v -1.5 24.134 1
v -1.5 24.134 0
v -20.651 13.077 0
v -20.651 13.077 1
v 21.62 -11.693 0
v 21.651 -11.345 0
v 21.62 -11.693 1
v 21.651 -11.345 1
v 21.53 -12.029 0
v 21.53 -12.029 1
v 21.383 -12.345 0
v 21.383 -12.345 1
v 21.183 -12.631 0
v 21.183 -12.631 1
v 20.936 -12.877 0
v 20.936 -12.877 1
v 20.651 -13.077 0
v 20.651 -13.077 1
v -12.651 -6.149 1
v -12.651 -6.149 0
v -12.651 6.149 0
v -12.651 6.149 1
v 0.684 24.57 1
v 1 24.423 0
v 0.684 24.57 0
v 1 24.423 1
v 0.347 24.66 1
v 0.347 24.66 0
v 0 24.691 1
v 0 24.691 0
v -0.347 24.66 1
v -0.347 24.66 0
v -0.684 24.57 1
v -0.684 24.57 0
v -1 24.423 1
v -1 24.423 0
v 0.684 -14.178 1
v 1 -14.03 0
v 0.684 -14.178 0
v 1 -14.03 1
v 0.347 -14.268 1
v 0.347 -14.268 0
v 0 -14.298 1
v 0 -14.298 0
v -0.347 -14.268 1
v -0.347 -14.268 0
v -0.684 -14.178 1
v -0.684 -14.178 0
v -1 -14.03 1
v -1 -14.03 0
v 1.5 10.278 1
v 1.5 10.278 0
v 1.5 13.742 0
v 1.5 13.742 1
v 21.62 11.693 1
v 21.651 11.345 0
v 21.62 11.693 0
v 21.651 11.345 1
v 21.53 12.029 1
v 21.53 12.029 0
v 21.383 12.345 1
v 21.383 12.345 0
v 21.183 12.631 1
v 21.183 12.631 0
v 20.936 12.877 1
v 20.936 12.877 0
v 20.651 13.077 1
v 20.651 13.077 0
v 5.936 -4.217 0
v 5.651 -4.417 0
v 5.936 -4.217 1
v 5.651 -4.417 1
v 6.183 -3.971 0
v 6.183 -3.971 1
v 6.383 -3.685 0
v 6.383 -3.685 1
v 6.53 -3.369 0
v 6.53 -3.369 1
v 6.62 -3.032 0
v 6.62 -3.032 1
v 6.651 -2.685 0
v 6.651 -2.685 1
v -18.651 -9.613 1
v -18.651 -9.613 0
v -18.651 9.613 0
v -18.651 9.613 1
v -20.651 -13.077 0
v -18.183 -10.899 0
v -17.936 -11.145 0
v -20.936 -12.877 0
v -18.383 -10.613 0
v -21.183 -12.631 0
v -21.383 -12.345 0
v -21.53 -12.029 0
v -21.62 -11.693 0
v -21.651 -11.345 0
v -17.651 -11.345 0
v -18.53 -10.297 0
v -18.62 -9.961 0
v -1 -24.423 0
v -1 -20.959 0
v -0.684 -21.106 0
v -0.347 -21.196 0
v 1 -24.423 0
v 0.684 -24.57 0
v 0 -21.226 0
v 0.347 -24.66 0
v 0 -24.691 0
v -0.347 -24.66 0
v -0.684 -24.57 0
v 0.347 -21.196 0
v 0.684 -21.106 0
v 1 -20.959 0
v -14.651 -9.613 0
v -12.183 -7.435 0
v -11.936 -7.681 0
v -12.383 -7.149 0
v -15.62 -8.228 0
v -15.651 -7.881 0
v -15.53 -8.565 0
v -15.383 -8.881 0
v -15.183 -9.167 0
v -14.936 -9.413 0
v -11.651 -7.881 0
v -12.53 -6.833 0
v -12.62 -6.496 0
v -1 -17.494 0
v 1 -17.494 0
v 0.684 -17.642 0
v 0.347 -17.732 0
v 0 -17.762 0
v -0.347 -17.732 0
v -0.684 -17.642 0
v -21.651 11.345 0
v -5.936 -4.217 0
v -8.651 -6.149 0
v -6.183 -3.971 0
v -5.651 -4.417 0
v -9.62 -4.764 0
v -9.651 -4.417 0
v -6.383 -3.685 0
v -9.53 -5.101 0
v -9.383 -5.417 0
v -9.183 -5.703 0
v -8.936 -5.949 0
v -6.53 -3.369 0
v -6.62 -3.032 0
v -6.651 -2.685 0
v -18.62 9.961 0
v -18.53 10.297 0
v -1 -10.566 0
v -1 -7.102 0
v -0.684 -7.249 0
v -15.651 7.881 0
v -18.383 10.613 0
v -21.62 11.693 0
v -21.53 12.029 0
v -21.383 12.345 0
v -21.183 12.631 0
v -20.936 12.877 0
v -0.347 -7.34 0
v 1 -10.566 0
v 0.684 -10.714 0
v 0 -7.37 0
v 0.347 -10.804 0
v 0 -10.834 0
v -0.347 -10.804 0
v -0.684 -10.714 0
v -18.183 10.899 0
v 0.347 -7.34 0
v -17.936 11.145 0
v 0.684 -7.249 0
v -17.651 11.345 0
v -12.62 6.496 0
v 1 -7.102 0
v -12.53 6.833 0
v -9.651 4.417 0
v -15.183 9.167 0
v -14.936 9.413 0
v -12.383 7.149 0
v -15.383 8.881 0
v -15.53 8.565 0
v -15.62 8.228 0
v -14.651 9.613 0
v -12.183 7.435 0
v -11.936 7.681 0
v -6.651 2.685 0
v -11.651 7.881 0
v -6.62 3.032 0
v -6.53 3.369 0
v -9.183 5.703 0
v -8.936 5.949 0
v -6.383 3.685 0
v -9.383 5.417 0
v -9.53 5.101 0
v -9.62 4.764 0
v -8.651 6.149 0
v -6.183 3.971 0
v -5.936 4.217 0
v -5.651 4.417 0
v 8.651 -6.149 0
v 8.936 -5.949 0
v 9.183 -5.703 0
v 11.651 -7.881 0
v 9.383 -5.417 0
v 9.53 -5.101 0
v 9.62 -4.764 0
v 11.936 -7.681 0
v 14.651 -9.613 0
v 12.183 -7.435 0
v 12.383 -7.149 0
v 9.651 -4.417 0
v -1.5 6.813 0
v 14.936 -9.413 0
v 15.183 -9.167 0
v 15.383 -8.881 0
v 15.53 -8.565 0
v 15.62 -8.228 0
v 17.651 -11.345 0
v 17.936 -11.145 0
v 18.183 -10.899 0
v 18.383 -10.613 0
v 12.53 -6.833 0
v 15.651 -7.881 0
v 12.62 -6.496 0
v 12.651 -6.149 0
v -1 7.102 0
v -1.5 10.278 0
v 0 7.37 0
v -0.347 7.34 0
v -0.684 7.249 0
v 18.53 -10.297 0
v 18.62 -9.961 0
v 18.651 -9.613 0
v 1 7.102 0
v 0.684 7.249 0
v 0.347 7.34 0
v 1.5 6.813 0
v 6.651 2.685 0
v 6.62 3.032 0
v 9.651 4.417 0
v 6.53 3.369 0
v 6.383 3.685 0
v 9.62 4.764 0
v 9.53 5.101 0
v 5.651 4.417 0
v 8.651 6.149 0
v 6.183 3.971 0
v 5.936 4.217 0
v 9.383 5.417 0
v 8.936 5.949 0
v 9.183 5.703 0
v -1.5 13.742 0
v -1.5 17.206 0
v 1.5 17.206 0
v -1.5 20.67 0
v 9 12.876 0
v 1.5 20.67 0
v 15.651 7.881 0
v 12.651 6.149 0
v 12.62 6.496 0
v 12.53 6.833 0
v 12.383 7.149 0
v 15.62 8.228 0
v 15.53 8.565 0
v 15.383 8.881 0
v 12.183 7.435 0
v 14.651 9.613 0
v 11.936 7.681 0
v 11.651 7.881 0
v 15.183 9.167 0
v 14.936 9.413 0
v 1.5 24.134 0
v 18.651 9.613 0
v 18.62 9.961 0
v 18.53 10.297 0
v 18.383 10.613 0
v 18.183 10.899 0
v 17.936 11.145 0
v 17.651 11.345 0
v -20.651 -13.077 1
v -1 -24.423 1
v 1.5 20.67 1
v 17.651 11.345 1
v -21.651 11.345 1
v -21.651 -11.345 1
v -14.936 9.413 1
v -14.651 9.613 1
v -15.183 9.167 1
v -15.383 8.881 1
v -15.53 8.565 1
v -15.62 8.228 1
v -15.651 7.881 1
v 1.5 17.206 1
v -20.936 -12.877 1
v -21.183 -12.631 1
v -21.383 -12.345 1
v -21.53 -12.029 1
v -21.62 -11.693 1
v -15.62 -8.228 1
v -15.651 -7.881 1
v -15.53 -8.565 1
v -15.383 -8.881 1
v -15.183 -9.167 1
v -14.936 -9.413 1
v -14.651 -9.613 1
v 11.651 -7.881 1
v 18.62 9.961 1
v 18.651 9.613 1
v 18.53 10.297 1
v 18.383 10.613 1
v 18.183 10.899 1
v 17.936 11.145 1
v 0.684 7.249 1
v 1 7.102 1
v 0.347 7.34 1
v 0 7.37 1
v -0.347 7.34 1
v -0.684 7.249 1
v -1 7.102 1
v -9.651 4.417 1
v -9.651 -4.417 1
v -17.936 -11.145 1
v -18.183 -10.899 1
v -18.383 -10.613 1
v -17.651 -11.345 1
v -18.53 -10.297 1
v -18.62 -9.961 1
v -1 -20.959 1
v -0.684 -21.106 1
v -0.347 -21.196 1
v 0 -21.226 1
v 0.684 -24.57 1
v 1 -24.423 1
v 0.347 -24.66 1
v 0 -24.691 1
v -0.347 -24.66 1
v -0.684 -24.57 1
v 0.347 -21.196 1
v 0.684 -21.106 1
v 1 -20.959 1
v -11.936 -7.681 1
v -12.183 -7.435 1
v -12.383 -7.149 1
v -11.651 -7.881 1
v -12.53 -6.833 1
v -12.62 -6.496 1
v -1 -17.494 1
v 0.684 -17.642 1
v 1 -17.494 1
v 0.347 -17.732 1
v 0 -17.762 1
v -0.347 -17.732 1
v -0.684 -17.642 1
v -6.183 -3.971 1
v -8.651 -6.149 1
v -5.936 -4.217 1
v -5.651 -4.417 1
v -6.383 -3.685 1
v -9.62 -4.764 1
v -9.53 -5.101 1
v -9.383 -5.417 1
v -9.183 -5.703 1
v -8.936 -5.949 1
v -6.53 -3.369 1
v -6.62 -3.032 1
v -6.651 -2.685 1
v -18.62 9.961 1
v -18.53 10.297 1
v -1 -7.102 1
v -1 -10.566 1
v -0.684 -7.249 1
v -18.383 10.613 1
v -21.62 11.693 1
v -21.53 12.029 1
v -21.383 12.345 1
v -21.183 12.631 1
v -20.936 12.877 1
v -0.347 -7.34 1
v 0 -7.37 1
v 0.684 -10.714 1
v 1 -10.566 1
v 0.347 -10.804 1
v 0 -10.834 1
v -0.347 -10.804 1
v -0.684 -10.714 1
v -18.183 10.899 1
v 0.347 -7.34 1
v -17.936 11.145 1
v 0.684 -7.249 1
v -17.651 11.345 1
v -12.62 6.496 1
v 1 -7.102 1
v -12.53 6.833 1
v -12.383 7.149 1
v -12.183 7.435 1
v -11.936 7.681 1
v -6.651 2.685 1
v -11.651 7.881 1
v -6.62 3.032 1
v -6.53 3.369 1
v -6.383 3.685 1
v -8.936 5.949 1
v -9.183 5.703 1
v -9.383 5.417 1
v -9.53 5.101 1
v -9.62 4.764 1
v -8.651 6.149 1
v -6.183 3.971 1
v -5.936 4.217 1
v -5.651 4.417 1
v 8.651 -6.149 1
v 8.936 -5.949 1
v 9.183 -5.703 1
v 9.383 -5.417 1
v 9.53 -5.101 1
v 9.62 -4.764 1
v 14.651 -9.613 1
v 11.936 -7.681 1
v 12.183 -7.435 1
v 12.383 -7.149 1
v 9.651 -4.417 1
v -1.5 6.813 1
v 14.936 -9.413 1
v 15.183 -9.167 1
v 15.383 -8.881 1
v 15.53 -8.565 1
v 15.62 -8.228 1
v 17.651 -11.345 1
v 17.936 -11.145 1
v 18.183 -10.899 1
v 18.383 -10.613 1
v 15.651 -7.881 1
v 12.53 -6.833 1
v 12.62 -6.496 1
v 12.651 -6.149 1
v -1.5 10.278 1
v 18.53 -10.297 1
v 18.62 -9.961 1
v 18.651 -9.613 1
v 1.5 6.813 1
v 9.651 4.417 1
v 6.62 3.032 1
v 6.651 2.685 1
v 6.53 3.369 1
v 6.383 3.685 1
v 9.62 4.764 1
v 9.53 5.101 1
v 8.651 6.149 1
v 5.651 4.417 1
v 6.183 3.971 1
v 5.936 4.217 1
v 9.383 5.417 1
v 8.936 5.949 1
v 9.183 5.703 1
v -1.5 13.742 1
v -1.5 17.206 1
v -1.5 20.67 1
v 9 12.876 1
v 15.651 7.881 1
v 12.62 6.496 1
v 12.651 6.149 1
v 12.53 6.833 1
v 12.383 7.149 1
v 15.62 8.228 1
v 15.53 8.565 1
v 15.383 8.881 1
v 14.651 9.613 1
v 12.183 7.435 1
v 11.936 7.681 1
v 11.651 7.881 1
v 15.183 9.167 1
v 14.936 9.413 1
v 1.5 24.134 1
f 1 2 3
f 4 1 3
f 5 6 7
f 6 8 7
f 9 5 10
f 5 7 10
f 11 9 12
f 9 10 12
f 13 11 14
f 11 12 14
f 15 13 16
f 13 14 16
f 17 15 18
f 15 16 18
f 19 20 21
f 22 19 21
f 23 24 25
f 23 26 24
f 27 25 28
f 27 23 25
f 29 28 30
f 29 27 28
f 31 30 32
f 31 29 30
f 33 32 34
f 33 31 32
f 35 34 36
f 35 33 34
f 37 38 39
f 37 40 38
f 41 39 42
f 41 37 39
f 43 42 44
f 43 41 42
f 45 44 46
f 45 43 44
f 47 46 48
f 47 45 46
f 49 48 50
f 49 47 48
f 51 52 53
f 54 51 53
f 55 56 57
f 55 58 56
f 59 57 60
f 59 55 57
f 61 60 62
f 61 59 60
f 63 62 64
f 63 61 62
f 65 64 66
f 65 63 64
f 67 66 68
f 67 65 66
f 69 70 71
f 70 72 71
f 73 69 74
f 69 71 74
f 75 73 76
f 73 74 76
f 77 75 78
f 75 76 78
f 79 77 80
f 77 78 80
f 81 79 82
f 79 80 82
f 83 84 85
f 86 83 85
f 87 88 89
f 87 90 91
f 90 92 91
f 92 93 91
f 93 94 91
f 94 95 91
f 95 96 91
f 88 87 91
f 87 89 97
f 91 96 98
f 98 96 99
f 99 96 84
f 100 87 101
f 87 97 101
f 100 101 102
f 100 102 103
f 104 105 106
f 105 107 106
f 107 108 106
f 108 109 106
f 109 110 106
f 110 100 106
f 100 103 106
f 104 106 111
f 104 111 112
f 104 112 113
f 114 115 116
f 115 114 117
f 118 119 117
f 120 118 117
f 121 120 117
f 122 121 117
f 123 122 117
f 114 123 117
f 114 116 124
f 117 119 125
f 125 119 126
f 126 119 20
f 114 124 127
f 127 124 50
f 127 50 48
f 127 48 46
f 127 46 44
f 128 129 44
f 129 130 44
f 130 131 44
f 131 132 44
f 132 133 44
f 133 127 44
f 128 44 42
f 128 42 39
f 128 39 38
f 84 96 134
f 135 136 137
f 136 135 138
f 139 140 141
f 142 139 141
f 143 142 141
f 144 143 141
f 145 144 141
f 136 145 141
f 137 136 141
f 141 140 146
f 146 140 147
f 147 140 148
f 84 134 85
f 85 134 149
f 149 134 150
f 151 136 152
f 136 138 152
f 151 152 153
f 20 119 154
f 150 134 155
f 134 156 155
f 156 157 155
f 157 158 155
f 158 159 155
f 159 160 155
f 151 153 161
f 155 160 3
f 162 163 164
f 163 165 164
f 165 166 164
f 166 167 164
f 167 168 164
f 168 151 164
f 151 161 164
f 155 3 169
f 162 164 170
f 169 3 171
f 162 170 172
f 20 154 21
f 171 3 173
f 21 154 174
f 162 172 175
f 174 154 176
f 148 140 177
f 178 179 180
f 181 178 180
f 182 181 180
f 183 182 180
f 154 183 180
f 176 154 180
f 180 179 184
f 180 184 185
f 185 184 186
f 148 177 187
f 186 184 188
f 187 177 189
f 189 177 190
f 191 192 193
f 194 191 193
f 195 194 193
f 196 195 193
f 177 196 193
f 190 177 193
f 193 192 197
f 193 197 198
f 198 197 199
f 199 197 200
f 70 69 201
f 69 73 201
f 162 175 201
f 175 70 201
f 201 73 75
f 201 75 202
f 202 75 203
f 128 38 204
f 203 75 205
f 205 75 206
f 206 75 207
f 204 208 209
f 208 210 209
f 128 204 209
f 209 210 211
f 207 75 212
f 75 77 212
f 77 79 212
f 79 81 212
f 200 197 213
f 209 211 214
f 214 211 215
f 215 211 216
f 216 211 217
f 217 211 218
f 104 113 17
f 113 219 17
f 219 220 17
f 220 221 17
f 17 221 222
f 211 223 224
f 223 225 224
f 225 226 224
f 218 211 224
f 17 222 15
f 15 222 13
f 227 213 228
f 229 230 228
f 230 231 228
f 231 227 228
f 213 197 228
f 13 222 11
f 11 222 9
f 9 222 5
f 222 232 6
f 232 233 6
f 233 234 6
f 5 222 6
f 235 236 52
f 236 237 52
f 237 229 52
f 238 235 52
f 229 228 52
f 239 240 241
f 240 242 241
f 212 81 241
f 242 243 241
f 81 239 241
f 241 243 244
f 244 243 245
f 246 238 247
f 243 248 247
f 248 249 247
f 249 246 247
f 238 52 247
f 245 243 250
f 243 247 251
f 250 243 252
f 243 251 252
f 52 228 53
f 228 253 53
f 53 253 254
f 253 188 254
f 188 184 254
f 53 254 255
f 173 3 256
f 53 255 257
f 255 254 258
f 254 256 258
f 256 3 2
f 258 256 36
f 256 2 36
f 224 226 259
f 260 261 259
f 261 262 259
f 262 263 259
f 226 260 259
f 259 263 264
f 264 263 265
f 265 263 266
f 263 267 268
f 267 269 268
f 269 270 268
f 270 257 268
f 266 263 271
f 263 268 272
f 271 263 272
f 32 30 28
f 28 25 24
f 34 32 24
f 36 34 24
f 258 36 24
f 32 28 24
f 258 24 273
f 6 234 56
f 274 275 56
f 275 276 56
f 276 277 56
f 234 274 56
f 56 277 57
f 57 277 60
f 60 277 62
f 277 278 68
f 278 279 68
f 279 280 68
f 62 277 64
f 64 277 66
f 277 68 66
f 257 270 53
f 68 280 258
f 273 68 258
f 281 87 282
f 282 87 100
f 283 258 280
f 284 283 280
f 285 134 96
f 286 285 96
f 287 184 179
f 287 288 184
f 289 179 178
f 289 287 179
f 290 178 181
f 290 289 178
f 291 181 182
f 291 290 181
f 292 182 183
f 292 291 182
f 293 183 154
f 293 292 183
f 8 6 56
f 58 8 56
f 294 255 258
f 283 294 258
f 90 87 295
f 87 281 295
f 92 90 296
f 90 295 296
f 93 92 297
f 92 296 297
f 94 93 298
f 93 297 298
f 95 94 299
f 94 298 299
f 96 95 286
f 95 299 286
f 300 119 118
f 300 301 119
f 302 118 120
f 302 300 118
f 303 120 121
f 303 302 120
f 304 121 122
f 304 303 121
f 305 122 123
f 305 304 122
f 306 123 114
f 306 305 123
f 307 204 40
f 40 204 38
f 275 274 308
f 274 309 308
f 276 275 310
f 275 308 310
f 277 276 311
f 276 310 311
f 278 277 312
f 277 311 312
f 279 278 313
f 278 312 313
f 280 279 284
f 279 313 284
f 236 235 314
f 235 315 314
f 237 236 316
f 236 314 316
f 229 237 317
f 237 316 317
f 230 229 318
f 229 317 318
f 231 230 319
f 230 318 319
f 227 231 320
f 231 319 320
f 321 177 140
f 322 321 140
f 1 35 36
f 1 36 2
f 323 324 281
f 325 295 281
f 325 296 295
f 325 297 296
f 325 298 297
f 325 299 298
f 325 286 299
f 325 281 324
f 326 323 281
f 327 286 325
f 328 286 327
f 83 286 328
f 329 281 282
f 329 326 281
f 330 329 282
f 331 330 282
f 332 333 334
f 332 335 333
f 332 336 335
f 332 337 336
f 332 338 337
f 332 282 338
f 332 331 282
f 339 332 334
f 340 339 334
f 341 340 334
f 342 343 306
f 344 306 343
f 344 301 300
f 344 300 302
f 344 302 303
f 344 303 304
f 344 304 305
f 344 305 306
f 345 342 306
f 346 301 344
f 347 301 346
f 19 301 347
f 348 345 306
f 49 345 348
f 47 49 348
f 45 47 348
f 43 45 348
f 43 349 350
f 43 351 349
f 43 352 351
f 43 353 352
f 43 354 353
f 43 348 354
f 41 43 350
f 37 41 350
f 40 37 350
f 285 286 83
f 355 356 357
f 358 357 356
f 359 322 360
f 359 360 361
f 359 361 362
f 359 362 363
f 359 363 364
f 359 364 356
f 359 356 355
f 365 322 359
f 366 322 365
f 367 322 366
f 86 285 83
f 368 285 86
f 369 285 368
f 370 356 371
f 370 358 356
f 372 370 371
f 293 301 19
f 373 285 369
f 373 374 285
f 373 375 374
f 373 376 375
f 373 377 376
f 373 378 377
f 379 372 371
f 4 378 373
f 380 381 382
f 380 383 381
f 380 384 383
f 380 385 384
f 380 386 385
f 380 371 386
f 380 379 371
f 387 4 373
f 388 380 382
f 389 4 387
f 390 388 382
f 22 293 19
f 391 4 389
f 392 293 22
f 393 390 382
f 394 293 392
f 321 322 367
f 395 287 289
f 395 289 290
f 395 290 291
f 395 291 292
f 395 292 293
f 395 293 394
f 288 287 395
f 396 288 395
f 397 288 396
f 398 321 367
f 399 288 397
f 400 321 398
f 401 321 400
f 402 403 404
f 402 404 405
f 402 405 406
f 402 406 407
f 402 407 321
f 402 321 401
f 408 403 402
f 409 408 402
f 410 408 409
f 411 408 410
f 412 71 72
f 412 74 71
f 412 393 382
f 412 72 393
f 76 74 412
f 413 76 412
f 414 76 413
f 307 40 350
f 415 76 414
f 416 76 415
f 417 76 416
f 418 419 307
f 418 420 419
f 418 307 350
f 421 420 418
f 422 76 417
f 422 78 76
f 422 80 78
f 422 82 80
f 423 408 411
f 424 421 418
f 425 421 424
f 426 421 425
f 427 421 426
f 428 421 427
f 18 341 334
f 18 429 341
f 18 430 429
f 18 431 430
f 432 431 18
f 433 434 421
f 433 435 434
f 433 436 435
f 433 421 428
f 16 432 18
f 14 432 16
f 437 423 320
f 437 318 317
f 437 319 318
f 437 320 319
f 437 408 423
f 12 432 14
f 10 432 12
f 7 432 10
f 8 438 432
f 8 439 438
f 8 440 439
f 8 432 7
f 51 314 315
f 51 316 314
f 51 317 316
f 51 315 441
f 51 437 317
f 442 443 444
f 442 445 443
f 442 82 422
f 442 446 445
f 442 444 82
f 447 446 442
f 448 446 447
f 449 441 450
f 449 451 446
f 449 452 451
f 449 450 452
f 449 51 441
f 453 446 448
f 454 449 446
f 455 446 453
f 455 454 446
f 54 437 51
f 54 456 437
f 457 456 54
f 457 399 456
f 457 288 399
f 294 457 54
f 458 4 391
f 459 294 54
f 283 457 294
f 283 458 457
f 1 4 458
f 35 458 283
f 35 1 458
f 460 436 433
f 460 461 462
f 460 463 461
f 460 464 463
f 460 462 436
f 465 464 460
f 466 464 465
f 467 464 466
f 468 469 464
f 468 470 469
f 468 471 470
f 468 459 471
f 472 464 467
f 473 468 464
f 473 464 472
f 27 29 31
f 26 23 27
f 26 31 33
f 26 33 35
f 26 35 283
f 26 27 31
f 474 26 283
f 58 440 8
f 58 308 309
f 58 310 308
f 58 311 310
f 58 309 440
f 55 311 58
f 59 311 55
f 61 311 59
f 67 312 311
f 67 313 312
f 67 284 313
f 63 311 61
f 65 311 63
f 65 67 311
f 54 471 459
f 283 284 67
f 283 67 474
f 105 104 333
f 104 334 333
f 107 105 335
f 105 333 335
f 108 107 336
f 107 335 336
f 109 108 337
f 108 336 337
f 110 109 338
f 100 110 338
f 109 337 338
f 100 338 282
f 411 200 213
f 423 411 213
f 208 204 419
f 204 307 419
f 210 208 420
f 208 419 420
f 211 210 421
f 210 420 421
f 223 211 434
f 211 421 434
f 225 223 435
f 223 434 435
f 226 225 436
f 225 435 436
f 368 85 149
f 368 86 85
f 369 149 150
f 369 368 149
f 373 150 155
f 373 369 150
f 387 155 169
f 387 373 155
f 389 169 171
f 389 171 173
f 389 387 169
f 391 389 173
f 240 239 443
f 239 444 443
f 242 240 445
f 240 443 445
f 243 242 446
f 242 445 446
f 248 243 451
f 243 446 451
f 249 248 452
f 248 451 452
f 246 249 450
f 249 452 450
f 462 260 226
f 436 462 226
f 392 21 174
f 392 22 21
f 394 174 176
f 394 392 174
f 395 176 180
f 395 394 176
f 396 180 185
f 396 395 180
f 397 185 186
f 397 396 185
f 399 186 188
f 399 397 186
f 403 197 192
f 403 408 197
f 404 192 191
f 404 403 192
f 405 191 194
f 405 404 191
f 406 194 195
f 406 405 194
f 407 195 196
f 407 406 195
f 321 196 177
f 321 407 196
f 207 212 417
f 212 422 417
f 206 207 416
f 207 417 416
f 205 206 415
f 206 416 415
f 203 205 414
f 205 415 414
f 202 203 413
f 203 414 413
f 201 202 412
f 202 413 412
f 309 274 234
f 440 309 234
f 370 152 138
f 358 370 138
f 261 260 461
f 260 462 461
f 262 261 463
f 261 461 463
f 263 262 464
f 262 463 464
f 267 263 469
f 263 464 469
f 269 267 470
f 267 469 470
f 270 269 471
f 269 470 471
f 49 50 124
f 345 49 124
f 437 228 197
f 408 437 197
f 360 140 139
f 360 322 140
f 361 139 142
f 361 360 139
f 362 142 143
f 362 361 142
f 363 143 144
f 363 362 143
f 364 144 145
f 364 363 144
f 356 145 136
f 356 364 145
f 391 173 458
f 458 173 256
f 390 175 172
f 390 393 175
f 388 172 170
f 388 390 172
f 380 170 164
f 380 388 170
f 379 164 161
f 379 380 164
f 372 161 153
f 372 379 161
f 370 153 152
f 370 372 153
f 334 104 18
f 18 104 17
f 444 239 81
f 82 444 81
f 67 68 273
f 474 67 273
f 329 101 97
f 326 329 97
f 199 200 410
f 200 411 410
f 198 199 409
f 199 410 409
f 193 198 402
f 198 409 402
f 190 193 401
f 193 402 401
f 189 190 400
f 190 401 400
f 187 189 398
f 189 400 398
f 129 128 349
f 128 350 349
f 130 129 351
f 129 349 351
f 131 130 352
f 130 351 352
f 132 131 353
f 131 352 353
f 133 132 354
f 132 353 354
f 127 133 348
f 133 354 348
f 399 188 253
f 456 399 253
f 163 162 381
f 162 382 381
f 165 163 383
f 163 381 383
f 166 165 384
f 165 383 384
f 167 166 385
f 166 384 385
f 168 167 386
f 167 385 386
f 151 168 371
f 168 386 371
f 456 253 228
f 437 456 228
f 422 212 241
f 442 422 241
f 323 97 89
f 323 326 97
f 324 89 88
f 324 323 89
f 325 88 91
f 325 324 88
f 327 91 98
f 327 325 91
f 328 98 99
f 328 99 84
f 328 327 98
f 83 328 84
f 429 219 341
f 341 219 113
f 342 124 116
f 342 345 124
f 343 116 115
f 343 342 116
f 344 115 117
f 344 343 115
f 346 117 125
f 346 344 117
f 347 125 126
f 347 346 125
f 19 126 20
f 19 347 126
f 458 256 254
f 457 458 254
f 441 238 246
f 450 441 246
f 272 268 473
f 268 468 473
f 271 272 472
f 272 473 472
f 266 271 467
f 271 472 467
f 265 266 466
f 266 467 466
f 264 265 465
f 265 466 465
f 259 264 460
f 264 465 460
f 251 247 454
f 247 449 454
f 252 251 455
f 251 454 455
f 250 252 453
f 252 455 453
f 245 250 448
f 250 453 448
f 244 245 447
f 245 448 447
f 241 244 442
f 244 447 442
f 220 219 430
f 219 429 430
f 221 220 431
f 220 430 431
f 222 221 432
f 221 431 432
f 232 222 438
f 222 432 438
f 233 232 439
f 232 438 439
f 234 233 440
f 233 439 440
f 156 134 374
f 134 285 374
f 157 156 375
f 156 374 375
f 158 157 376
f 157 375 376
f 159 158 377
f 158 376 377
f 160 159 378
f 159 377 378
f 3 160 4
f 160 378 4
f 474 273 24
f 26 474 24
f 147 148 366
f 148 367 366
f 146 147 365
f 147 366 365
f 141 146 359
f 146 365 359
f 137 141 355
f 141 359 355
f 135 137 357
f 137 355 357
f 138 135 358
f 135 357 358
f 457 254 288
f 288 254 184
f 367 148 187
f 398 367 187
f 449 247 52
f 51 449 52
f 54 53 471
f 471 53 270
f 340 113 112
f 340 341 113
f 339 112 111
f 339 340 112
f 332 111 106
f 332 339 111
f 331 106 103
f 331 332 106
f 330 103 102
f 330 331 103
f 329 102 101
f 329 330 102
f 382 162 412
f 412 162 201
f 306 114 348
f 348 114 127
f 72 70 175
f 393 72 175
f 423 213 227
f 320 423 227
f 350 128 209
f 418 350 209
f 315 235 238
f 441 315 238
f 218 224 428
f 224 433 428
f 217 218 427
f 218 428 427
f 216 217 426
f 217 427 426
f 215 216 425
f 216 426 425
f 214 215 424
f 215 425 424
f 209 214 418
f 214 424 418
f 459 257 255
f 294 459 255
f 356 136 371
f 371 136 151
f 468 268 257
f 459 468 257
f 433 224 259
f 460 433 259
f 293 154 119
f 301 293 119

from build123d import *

# Parameters (mm, degrees)
F1_DEPTH = 1
F2_R     = 2


with BuildPart() as f1:
    # F0 (on Top) → F1 (new body)
    with BuildSketch(Plane.XY):
        Polygon((21.650635, -12.5), (21.650635, 12.5), (1.5, 24.133975), (0, 25), (-1.5, 24.133975), (-21.650635, 12.5), (-21.650635, -12.5), (0, -25), align=None)
        Polygon((0, -14.607695), (-12.650635, -7.303848), (-12.650635, 7.303848), (-1.5, 13.74167), (-1.5, 10.277568), (-9.650635, 5.571797), (-9.650635, -5.571797), (0, -11.143594), (9.650635, -5.571797), (9.650635, 5.571797), (1.5, 10.277568), (1.5, 13.74167), (12.650635, 7.303848), (12.650635, -7.303848), align=None, mode=Mode.SUBTRACT)
        Polygon((0, -21.535898), (-18.650635, -10.767949), (-18.650635, 10.767949), (-1.5, 20.669873), (-1.5, 17.205771), (-15.650635, 9.035898), (-15.650635, -9.035898), (0, -18.071797), (15.650635, -9.035898), (15.650635, 9.035898), (9, 12.875644), (1.5, 17.205771), (1.5, 20.669873), (18.650635, 10.767949), (18.650635, -10.767949), align=None, mode=Mode.SUBTRACT)
        Polygon((0, -7.679492), (-6.650635, -3.839746), (-6.650635, 3.839746), (-1.5, 6.813467), (0, 7.679492), (1.5, 6.813467), (6.650635, 3.839746), (6.650635, -3.839746), align=None, mode=Mode.SUBTRACT)
    extrude(amount=F1_DEPTH)

    # F2
    f2_edges = [f1.edges().sort_by_distance(p)[0] for p in [
        (0, 25, 0.5),
        (-21.650635, 12.5, 0.5),
        (-21.650635, -12.5, 0.5),
        (21.650635, 12.5, 0.5),
        (21.650635, -12.5, 0.5),
        (0, -25, 0.5),
        (-18.650635, -10.767949, 0.5),
        (-18.650635, 10.767949, 0.5),
        (18.650635, 10.767949, 0.5),
        (18.650635, -10.767949, 0.5),
        (0, -21.535898, 0.5),
        (0, -14.607695, 0.5),
        (-15.650635, -9.035898, 0.5),
        (-15.650635, 9.035898, 0.5),
        (-9.650635, 5.571797, 0.5),
        (-9.650635, -5.571797, 0.5),
        (0, -11.143594, 0.5),
        (9.650635, -5.571797, 0.5),
        (9.650635, 5.571797, 0.5),
        (12.650635, 7.303848, 0.5),
        (-12.650635, -7.303848, 0.5),
        (-6.650635, 3.839746, 0.5),
        (-6.650635, -3.839746, 0.5),
        (-12.650635, 7.303848, 0.5),
        (0, 7.679492, 0.5),
        (6.650635, 3.839746, 0.5),
        (6.650635, -3.839746, 0.5),
        (0, -7.679492, 0.5),
        (12.650635, -7.303848, 0.5),
        (15.650635, -9.035898, 0.5),
        (0, -18.071797, 0.5),
        (15.650635, 9.035898, 0.5),
    ]]
    fillet(f2_edges, radius=F2_R)


solid = f1.part
